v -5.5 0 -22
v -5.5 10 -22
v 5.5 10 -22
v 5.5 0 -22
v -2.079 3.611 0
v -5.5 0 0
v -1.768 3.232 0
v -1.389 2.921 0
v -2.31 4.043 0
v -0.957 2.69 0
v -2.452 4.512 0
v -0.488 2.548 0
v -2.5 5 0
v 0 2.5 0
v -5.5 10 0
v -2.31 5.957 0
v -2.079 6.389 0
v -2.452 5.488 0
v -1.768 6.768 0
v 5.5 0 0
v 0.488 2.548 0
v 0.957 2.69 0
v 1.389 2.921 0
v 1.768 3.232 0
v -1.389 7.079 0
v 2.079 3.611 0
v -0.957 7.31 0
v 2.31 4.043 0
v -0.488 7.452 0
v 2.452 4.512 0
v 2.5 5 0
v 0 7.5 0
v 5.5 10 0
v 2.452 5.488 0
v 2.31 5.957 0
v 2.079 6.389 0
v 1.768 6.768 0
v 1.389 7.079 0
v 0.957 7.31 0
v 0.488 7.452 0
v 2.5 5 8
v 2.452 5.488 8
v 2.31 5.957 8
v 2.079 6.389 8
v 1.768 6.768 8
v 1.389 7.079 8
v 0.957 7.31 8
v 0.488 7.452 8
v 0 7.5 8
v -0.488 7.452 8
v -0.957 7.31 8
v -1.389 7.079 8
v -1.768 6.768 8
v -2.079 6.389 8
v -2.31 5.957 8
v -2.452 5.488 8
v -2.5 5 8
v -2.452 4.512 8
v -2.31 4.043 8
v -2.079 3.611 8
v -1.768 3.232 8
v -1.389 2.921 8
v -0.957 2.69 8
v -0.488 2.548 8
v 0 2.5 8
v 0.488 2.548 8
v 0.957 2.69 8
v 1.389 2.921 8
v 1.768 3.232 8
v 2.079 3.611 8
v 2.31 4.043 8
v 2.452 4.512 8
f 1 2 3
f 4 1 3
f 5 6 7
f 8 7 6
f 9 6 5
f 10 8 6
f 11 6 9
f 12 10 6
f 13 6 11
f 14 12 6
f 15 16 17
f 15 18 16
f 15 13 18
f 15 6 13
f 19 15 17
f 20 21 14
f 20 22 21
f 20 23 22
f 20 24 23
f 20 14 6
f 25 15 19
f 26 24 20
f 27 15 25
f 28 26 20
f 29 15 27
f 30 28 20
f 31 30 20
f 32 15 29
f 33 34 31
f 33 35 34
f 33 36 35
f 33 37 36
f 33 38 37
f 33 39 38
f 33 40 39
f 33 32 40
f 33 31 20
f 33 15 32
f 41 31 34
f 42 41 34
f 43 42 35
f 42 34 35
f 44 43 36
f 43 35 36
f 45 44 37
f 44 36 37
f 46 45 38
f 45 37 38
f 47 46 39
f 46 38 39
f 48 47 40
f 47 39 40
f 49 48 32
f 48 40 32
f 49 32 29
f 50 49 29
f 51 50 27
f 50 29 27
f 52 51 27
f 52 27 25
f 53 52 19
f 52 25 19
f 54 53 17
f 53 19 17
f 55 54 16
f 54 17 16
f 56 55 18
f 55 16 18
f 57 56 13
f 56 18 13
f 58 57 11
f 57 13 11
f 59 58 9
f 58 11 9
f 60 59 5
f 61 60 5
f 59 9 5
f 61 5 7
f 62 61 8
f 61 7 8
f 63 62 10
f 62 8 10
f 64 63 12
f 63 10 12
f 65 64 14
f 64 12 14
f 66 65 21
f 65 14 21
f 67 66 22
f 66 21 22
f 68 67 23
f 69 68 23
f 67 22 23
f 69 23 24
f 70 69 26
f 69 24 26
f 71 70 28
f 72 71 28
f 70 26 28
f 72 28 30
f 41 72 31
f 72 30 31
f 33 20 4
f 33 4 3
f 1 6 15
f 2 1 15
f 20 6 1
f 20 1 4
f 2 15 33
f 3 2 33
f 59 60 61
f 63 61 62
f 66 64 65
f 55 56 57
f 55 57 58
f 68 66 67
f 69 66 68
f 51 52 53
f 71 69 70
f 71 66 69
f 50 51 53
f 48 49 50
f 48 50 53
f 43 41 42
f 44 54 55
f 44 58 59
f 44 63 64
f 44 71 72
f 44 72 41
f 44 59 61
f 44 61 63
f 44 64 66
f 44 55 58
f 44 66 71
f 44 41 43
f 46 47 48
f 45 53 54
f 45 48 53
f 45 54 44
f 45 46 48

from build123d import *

# Parameters (mm, degrees)
SKIZZE1_W               = 11
SKIZZE1_H               = 10
LINEAR_AUSTRAGEN1_DEPTH = 22
SKIZZE2_R               = 2.5
LINEAR_AUSTRAGEN2_DEPTH = 8


with BuildPart() as part:
    # Skizze1 → Linear austragen1 (new body)
    with BuildSketch(Plane.XY):
        with Locations((0, 5)):
            Rectangle(SKIZZE1_W, SKIZZE1_H)
    extrude(amount=-LINEAR_AUSTRAGEN1_DEPTH)

    # Skizze2 → Linear austragen2 (add)
    with BuildSketch(Plane.XY):
        with Locations((0, 5)):
            Circle(SKIZZE2_R)
    extrude(amount=LINEAR_AUSTRAGEN2_DEPTH)


solid = part.part
